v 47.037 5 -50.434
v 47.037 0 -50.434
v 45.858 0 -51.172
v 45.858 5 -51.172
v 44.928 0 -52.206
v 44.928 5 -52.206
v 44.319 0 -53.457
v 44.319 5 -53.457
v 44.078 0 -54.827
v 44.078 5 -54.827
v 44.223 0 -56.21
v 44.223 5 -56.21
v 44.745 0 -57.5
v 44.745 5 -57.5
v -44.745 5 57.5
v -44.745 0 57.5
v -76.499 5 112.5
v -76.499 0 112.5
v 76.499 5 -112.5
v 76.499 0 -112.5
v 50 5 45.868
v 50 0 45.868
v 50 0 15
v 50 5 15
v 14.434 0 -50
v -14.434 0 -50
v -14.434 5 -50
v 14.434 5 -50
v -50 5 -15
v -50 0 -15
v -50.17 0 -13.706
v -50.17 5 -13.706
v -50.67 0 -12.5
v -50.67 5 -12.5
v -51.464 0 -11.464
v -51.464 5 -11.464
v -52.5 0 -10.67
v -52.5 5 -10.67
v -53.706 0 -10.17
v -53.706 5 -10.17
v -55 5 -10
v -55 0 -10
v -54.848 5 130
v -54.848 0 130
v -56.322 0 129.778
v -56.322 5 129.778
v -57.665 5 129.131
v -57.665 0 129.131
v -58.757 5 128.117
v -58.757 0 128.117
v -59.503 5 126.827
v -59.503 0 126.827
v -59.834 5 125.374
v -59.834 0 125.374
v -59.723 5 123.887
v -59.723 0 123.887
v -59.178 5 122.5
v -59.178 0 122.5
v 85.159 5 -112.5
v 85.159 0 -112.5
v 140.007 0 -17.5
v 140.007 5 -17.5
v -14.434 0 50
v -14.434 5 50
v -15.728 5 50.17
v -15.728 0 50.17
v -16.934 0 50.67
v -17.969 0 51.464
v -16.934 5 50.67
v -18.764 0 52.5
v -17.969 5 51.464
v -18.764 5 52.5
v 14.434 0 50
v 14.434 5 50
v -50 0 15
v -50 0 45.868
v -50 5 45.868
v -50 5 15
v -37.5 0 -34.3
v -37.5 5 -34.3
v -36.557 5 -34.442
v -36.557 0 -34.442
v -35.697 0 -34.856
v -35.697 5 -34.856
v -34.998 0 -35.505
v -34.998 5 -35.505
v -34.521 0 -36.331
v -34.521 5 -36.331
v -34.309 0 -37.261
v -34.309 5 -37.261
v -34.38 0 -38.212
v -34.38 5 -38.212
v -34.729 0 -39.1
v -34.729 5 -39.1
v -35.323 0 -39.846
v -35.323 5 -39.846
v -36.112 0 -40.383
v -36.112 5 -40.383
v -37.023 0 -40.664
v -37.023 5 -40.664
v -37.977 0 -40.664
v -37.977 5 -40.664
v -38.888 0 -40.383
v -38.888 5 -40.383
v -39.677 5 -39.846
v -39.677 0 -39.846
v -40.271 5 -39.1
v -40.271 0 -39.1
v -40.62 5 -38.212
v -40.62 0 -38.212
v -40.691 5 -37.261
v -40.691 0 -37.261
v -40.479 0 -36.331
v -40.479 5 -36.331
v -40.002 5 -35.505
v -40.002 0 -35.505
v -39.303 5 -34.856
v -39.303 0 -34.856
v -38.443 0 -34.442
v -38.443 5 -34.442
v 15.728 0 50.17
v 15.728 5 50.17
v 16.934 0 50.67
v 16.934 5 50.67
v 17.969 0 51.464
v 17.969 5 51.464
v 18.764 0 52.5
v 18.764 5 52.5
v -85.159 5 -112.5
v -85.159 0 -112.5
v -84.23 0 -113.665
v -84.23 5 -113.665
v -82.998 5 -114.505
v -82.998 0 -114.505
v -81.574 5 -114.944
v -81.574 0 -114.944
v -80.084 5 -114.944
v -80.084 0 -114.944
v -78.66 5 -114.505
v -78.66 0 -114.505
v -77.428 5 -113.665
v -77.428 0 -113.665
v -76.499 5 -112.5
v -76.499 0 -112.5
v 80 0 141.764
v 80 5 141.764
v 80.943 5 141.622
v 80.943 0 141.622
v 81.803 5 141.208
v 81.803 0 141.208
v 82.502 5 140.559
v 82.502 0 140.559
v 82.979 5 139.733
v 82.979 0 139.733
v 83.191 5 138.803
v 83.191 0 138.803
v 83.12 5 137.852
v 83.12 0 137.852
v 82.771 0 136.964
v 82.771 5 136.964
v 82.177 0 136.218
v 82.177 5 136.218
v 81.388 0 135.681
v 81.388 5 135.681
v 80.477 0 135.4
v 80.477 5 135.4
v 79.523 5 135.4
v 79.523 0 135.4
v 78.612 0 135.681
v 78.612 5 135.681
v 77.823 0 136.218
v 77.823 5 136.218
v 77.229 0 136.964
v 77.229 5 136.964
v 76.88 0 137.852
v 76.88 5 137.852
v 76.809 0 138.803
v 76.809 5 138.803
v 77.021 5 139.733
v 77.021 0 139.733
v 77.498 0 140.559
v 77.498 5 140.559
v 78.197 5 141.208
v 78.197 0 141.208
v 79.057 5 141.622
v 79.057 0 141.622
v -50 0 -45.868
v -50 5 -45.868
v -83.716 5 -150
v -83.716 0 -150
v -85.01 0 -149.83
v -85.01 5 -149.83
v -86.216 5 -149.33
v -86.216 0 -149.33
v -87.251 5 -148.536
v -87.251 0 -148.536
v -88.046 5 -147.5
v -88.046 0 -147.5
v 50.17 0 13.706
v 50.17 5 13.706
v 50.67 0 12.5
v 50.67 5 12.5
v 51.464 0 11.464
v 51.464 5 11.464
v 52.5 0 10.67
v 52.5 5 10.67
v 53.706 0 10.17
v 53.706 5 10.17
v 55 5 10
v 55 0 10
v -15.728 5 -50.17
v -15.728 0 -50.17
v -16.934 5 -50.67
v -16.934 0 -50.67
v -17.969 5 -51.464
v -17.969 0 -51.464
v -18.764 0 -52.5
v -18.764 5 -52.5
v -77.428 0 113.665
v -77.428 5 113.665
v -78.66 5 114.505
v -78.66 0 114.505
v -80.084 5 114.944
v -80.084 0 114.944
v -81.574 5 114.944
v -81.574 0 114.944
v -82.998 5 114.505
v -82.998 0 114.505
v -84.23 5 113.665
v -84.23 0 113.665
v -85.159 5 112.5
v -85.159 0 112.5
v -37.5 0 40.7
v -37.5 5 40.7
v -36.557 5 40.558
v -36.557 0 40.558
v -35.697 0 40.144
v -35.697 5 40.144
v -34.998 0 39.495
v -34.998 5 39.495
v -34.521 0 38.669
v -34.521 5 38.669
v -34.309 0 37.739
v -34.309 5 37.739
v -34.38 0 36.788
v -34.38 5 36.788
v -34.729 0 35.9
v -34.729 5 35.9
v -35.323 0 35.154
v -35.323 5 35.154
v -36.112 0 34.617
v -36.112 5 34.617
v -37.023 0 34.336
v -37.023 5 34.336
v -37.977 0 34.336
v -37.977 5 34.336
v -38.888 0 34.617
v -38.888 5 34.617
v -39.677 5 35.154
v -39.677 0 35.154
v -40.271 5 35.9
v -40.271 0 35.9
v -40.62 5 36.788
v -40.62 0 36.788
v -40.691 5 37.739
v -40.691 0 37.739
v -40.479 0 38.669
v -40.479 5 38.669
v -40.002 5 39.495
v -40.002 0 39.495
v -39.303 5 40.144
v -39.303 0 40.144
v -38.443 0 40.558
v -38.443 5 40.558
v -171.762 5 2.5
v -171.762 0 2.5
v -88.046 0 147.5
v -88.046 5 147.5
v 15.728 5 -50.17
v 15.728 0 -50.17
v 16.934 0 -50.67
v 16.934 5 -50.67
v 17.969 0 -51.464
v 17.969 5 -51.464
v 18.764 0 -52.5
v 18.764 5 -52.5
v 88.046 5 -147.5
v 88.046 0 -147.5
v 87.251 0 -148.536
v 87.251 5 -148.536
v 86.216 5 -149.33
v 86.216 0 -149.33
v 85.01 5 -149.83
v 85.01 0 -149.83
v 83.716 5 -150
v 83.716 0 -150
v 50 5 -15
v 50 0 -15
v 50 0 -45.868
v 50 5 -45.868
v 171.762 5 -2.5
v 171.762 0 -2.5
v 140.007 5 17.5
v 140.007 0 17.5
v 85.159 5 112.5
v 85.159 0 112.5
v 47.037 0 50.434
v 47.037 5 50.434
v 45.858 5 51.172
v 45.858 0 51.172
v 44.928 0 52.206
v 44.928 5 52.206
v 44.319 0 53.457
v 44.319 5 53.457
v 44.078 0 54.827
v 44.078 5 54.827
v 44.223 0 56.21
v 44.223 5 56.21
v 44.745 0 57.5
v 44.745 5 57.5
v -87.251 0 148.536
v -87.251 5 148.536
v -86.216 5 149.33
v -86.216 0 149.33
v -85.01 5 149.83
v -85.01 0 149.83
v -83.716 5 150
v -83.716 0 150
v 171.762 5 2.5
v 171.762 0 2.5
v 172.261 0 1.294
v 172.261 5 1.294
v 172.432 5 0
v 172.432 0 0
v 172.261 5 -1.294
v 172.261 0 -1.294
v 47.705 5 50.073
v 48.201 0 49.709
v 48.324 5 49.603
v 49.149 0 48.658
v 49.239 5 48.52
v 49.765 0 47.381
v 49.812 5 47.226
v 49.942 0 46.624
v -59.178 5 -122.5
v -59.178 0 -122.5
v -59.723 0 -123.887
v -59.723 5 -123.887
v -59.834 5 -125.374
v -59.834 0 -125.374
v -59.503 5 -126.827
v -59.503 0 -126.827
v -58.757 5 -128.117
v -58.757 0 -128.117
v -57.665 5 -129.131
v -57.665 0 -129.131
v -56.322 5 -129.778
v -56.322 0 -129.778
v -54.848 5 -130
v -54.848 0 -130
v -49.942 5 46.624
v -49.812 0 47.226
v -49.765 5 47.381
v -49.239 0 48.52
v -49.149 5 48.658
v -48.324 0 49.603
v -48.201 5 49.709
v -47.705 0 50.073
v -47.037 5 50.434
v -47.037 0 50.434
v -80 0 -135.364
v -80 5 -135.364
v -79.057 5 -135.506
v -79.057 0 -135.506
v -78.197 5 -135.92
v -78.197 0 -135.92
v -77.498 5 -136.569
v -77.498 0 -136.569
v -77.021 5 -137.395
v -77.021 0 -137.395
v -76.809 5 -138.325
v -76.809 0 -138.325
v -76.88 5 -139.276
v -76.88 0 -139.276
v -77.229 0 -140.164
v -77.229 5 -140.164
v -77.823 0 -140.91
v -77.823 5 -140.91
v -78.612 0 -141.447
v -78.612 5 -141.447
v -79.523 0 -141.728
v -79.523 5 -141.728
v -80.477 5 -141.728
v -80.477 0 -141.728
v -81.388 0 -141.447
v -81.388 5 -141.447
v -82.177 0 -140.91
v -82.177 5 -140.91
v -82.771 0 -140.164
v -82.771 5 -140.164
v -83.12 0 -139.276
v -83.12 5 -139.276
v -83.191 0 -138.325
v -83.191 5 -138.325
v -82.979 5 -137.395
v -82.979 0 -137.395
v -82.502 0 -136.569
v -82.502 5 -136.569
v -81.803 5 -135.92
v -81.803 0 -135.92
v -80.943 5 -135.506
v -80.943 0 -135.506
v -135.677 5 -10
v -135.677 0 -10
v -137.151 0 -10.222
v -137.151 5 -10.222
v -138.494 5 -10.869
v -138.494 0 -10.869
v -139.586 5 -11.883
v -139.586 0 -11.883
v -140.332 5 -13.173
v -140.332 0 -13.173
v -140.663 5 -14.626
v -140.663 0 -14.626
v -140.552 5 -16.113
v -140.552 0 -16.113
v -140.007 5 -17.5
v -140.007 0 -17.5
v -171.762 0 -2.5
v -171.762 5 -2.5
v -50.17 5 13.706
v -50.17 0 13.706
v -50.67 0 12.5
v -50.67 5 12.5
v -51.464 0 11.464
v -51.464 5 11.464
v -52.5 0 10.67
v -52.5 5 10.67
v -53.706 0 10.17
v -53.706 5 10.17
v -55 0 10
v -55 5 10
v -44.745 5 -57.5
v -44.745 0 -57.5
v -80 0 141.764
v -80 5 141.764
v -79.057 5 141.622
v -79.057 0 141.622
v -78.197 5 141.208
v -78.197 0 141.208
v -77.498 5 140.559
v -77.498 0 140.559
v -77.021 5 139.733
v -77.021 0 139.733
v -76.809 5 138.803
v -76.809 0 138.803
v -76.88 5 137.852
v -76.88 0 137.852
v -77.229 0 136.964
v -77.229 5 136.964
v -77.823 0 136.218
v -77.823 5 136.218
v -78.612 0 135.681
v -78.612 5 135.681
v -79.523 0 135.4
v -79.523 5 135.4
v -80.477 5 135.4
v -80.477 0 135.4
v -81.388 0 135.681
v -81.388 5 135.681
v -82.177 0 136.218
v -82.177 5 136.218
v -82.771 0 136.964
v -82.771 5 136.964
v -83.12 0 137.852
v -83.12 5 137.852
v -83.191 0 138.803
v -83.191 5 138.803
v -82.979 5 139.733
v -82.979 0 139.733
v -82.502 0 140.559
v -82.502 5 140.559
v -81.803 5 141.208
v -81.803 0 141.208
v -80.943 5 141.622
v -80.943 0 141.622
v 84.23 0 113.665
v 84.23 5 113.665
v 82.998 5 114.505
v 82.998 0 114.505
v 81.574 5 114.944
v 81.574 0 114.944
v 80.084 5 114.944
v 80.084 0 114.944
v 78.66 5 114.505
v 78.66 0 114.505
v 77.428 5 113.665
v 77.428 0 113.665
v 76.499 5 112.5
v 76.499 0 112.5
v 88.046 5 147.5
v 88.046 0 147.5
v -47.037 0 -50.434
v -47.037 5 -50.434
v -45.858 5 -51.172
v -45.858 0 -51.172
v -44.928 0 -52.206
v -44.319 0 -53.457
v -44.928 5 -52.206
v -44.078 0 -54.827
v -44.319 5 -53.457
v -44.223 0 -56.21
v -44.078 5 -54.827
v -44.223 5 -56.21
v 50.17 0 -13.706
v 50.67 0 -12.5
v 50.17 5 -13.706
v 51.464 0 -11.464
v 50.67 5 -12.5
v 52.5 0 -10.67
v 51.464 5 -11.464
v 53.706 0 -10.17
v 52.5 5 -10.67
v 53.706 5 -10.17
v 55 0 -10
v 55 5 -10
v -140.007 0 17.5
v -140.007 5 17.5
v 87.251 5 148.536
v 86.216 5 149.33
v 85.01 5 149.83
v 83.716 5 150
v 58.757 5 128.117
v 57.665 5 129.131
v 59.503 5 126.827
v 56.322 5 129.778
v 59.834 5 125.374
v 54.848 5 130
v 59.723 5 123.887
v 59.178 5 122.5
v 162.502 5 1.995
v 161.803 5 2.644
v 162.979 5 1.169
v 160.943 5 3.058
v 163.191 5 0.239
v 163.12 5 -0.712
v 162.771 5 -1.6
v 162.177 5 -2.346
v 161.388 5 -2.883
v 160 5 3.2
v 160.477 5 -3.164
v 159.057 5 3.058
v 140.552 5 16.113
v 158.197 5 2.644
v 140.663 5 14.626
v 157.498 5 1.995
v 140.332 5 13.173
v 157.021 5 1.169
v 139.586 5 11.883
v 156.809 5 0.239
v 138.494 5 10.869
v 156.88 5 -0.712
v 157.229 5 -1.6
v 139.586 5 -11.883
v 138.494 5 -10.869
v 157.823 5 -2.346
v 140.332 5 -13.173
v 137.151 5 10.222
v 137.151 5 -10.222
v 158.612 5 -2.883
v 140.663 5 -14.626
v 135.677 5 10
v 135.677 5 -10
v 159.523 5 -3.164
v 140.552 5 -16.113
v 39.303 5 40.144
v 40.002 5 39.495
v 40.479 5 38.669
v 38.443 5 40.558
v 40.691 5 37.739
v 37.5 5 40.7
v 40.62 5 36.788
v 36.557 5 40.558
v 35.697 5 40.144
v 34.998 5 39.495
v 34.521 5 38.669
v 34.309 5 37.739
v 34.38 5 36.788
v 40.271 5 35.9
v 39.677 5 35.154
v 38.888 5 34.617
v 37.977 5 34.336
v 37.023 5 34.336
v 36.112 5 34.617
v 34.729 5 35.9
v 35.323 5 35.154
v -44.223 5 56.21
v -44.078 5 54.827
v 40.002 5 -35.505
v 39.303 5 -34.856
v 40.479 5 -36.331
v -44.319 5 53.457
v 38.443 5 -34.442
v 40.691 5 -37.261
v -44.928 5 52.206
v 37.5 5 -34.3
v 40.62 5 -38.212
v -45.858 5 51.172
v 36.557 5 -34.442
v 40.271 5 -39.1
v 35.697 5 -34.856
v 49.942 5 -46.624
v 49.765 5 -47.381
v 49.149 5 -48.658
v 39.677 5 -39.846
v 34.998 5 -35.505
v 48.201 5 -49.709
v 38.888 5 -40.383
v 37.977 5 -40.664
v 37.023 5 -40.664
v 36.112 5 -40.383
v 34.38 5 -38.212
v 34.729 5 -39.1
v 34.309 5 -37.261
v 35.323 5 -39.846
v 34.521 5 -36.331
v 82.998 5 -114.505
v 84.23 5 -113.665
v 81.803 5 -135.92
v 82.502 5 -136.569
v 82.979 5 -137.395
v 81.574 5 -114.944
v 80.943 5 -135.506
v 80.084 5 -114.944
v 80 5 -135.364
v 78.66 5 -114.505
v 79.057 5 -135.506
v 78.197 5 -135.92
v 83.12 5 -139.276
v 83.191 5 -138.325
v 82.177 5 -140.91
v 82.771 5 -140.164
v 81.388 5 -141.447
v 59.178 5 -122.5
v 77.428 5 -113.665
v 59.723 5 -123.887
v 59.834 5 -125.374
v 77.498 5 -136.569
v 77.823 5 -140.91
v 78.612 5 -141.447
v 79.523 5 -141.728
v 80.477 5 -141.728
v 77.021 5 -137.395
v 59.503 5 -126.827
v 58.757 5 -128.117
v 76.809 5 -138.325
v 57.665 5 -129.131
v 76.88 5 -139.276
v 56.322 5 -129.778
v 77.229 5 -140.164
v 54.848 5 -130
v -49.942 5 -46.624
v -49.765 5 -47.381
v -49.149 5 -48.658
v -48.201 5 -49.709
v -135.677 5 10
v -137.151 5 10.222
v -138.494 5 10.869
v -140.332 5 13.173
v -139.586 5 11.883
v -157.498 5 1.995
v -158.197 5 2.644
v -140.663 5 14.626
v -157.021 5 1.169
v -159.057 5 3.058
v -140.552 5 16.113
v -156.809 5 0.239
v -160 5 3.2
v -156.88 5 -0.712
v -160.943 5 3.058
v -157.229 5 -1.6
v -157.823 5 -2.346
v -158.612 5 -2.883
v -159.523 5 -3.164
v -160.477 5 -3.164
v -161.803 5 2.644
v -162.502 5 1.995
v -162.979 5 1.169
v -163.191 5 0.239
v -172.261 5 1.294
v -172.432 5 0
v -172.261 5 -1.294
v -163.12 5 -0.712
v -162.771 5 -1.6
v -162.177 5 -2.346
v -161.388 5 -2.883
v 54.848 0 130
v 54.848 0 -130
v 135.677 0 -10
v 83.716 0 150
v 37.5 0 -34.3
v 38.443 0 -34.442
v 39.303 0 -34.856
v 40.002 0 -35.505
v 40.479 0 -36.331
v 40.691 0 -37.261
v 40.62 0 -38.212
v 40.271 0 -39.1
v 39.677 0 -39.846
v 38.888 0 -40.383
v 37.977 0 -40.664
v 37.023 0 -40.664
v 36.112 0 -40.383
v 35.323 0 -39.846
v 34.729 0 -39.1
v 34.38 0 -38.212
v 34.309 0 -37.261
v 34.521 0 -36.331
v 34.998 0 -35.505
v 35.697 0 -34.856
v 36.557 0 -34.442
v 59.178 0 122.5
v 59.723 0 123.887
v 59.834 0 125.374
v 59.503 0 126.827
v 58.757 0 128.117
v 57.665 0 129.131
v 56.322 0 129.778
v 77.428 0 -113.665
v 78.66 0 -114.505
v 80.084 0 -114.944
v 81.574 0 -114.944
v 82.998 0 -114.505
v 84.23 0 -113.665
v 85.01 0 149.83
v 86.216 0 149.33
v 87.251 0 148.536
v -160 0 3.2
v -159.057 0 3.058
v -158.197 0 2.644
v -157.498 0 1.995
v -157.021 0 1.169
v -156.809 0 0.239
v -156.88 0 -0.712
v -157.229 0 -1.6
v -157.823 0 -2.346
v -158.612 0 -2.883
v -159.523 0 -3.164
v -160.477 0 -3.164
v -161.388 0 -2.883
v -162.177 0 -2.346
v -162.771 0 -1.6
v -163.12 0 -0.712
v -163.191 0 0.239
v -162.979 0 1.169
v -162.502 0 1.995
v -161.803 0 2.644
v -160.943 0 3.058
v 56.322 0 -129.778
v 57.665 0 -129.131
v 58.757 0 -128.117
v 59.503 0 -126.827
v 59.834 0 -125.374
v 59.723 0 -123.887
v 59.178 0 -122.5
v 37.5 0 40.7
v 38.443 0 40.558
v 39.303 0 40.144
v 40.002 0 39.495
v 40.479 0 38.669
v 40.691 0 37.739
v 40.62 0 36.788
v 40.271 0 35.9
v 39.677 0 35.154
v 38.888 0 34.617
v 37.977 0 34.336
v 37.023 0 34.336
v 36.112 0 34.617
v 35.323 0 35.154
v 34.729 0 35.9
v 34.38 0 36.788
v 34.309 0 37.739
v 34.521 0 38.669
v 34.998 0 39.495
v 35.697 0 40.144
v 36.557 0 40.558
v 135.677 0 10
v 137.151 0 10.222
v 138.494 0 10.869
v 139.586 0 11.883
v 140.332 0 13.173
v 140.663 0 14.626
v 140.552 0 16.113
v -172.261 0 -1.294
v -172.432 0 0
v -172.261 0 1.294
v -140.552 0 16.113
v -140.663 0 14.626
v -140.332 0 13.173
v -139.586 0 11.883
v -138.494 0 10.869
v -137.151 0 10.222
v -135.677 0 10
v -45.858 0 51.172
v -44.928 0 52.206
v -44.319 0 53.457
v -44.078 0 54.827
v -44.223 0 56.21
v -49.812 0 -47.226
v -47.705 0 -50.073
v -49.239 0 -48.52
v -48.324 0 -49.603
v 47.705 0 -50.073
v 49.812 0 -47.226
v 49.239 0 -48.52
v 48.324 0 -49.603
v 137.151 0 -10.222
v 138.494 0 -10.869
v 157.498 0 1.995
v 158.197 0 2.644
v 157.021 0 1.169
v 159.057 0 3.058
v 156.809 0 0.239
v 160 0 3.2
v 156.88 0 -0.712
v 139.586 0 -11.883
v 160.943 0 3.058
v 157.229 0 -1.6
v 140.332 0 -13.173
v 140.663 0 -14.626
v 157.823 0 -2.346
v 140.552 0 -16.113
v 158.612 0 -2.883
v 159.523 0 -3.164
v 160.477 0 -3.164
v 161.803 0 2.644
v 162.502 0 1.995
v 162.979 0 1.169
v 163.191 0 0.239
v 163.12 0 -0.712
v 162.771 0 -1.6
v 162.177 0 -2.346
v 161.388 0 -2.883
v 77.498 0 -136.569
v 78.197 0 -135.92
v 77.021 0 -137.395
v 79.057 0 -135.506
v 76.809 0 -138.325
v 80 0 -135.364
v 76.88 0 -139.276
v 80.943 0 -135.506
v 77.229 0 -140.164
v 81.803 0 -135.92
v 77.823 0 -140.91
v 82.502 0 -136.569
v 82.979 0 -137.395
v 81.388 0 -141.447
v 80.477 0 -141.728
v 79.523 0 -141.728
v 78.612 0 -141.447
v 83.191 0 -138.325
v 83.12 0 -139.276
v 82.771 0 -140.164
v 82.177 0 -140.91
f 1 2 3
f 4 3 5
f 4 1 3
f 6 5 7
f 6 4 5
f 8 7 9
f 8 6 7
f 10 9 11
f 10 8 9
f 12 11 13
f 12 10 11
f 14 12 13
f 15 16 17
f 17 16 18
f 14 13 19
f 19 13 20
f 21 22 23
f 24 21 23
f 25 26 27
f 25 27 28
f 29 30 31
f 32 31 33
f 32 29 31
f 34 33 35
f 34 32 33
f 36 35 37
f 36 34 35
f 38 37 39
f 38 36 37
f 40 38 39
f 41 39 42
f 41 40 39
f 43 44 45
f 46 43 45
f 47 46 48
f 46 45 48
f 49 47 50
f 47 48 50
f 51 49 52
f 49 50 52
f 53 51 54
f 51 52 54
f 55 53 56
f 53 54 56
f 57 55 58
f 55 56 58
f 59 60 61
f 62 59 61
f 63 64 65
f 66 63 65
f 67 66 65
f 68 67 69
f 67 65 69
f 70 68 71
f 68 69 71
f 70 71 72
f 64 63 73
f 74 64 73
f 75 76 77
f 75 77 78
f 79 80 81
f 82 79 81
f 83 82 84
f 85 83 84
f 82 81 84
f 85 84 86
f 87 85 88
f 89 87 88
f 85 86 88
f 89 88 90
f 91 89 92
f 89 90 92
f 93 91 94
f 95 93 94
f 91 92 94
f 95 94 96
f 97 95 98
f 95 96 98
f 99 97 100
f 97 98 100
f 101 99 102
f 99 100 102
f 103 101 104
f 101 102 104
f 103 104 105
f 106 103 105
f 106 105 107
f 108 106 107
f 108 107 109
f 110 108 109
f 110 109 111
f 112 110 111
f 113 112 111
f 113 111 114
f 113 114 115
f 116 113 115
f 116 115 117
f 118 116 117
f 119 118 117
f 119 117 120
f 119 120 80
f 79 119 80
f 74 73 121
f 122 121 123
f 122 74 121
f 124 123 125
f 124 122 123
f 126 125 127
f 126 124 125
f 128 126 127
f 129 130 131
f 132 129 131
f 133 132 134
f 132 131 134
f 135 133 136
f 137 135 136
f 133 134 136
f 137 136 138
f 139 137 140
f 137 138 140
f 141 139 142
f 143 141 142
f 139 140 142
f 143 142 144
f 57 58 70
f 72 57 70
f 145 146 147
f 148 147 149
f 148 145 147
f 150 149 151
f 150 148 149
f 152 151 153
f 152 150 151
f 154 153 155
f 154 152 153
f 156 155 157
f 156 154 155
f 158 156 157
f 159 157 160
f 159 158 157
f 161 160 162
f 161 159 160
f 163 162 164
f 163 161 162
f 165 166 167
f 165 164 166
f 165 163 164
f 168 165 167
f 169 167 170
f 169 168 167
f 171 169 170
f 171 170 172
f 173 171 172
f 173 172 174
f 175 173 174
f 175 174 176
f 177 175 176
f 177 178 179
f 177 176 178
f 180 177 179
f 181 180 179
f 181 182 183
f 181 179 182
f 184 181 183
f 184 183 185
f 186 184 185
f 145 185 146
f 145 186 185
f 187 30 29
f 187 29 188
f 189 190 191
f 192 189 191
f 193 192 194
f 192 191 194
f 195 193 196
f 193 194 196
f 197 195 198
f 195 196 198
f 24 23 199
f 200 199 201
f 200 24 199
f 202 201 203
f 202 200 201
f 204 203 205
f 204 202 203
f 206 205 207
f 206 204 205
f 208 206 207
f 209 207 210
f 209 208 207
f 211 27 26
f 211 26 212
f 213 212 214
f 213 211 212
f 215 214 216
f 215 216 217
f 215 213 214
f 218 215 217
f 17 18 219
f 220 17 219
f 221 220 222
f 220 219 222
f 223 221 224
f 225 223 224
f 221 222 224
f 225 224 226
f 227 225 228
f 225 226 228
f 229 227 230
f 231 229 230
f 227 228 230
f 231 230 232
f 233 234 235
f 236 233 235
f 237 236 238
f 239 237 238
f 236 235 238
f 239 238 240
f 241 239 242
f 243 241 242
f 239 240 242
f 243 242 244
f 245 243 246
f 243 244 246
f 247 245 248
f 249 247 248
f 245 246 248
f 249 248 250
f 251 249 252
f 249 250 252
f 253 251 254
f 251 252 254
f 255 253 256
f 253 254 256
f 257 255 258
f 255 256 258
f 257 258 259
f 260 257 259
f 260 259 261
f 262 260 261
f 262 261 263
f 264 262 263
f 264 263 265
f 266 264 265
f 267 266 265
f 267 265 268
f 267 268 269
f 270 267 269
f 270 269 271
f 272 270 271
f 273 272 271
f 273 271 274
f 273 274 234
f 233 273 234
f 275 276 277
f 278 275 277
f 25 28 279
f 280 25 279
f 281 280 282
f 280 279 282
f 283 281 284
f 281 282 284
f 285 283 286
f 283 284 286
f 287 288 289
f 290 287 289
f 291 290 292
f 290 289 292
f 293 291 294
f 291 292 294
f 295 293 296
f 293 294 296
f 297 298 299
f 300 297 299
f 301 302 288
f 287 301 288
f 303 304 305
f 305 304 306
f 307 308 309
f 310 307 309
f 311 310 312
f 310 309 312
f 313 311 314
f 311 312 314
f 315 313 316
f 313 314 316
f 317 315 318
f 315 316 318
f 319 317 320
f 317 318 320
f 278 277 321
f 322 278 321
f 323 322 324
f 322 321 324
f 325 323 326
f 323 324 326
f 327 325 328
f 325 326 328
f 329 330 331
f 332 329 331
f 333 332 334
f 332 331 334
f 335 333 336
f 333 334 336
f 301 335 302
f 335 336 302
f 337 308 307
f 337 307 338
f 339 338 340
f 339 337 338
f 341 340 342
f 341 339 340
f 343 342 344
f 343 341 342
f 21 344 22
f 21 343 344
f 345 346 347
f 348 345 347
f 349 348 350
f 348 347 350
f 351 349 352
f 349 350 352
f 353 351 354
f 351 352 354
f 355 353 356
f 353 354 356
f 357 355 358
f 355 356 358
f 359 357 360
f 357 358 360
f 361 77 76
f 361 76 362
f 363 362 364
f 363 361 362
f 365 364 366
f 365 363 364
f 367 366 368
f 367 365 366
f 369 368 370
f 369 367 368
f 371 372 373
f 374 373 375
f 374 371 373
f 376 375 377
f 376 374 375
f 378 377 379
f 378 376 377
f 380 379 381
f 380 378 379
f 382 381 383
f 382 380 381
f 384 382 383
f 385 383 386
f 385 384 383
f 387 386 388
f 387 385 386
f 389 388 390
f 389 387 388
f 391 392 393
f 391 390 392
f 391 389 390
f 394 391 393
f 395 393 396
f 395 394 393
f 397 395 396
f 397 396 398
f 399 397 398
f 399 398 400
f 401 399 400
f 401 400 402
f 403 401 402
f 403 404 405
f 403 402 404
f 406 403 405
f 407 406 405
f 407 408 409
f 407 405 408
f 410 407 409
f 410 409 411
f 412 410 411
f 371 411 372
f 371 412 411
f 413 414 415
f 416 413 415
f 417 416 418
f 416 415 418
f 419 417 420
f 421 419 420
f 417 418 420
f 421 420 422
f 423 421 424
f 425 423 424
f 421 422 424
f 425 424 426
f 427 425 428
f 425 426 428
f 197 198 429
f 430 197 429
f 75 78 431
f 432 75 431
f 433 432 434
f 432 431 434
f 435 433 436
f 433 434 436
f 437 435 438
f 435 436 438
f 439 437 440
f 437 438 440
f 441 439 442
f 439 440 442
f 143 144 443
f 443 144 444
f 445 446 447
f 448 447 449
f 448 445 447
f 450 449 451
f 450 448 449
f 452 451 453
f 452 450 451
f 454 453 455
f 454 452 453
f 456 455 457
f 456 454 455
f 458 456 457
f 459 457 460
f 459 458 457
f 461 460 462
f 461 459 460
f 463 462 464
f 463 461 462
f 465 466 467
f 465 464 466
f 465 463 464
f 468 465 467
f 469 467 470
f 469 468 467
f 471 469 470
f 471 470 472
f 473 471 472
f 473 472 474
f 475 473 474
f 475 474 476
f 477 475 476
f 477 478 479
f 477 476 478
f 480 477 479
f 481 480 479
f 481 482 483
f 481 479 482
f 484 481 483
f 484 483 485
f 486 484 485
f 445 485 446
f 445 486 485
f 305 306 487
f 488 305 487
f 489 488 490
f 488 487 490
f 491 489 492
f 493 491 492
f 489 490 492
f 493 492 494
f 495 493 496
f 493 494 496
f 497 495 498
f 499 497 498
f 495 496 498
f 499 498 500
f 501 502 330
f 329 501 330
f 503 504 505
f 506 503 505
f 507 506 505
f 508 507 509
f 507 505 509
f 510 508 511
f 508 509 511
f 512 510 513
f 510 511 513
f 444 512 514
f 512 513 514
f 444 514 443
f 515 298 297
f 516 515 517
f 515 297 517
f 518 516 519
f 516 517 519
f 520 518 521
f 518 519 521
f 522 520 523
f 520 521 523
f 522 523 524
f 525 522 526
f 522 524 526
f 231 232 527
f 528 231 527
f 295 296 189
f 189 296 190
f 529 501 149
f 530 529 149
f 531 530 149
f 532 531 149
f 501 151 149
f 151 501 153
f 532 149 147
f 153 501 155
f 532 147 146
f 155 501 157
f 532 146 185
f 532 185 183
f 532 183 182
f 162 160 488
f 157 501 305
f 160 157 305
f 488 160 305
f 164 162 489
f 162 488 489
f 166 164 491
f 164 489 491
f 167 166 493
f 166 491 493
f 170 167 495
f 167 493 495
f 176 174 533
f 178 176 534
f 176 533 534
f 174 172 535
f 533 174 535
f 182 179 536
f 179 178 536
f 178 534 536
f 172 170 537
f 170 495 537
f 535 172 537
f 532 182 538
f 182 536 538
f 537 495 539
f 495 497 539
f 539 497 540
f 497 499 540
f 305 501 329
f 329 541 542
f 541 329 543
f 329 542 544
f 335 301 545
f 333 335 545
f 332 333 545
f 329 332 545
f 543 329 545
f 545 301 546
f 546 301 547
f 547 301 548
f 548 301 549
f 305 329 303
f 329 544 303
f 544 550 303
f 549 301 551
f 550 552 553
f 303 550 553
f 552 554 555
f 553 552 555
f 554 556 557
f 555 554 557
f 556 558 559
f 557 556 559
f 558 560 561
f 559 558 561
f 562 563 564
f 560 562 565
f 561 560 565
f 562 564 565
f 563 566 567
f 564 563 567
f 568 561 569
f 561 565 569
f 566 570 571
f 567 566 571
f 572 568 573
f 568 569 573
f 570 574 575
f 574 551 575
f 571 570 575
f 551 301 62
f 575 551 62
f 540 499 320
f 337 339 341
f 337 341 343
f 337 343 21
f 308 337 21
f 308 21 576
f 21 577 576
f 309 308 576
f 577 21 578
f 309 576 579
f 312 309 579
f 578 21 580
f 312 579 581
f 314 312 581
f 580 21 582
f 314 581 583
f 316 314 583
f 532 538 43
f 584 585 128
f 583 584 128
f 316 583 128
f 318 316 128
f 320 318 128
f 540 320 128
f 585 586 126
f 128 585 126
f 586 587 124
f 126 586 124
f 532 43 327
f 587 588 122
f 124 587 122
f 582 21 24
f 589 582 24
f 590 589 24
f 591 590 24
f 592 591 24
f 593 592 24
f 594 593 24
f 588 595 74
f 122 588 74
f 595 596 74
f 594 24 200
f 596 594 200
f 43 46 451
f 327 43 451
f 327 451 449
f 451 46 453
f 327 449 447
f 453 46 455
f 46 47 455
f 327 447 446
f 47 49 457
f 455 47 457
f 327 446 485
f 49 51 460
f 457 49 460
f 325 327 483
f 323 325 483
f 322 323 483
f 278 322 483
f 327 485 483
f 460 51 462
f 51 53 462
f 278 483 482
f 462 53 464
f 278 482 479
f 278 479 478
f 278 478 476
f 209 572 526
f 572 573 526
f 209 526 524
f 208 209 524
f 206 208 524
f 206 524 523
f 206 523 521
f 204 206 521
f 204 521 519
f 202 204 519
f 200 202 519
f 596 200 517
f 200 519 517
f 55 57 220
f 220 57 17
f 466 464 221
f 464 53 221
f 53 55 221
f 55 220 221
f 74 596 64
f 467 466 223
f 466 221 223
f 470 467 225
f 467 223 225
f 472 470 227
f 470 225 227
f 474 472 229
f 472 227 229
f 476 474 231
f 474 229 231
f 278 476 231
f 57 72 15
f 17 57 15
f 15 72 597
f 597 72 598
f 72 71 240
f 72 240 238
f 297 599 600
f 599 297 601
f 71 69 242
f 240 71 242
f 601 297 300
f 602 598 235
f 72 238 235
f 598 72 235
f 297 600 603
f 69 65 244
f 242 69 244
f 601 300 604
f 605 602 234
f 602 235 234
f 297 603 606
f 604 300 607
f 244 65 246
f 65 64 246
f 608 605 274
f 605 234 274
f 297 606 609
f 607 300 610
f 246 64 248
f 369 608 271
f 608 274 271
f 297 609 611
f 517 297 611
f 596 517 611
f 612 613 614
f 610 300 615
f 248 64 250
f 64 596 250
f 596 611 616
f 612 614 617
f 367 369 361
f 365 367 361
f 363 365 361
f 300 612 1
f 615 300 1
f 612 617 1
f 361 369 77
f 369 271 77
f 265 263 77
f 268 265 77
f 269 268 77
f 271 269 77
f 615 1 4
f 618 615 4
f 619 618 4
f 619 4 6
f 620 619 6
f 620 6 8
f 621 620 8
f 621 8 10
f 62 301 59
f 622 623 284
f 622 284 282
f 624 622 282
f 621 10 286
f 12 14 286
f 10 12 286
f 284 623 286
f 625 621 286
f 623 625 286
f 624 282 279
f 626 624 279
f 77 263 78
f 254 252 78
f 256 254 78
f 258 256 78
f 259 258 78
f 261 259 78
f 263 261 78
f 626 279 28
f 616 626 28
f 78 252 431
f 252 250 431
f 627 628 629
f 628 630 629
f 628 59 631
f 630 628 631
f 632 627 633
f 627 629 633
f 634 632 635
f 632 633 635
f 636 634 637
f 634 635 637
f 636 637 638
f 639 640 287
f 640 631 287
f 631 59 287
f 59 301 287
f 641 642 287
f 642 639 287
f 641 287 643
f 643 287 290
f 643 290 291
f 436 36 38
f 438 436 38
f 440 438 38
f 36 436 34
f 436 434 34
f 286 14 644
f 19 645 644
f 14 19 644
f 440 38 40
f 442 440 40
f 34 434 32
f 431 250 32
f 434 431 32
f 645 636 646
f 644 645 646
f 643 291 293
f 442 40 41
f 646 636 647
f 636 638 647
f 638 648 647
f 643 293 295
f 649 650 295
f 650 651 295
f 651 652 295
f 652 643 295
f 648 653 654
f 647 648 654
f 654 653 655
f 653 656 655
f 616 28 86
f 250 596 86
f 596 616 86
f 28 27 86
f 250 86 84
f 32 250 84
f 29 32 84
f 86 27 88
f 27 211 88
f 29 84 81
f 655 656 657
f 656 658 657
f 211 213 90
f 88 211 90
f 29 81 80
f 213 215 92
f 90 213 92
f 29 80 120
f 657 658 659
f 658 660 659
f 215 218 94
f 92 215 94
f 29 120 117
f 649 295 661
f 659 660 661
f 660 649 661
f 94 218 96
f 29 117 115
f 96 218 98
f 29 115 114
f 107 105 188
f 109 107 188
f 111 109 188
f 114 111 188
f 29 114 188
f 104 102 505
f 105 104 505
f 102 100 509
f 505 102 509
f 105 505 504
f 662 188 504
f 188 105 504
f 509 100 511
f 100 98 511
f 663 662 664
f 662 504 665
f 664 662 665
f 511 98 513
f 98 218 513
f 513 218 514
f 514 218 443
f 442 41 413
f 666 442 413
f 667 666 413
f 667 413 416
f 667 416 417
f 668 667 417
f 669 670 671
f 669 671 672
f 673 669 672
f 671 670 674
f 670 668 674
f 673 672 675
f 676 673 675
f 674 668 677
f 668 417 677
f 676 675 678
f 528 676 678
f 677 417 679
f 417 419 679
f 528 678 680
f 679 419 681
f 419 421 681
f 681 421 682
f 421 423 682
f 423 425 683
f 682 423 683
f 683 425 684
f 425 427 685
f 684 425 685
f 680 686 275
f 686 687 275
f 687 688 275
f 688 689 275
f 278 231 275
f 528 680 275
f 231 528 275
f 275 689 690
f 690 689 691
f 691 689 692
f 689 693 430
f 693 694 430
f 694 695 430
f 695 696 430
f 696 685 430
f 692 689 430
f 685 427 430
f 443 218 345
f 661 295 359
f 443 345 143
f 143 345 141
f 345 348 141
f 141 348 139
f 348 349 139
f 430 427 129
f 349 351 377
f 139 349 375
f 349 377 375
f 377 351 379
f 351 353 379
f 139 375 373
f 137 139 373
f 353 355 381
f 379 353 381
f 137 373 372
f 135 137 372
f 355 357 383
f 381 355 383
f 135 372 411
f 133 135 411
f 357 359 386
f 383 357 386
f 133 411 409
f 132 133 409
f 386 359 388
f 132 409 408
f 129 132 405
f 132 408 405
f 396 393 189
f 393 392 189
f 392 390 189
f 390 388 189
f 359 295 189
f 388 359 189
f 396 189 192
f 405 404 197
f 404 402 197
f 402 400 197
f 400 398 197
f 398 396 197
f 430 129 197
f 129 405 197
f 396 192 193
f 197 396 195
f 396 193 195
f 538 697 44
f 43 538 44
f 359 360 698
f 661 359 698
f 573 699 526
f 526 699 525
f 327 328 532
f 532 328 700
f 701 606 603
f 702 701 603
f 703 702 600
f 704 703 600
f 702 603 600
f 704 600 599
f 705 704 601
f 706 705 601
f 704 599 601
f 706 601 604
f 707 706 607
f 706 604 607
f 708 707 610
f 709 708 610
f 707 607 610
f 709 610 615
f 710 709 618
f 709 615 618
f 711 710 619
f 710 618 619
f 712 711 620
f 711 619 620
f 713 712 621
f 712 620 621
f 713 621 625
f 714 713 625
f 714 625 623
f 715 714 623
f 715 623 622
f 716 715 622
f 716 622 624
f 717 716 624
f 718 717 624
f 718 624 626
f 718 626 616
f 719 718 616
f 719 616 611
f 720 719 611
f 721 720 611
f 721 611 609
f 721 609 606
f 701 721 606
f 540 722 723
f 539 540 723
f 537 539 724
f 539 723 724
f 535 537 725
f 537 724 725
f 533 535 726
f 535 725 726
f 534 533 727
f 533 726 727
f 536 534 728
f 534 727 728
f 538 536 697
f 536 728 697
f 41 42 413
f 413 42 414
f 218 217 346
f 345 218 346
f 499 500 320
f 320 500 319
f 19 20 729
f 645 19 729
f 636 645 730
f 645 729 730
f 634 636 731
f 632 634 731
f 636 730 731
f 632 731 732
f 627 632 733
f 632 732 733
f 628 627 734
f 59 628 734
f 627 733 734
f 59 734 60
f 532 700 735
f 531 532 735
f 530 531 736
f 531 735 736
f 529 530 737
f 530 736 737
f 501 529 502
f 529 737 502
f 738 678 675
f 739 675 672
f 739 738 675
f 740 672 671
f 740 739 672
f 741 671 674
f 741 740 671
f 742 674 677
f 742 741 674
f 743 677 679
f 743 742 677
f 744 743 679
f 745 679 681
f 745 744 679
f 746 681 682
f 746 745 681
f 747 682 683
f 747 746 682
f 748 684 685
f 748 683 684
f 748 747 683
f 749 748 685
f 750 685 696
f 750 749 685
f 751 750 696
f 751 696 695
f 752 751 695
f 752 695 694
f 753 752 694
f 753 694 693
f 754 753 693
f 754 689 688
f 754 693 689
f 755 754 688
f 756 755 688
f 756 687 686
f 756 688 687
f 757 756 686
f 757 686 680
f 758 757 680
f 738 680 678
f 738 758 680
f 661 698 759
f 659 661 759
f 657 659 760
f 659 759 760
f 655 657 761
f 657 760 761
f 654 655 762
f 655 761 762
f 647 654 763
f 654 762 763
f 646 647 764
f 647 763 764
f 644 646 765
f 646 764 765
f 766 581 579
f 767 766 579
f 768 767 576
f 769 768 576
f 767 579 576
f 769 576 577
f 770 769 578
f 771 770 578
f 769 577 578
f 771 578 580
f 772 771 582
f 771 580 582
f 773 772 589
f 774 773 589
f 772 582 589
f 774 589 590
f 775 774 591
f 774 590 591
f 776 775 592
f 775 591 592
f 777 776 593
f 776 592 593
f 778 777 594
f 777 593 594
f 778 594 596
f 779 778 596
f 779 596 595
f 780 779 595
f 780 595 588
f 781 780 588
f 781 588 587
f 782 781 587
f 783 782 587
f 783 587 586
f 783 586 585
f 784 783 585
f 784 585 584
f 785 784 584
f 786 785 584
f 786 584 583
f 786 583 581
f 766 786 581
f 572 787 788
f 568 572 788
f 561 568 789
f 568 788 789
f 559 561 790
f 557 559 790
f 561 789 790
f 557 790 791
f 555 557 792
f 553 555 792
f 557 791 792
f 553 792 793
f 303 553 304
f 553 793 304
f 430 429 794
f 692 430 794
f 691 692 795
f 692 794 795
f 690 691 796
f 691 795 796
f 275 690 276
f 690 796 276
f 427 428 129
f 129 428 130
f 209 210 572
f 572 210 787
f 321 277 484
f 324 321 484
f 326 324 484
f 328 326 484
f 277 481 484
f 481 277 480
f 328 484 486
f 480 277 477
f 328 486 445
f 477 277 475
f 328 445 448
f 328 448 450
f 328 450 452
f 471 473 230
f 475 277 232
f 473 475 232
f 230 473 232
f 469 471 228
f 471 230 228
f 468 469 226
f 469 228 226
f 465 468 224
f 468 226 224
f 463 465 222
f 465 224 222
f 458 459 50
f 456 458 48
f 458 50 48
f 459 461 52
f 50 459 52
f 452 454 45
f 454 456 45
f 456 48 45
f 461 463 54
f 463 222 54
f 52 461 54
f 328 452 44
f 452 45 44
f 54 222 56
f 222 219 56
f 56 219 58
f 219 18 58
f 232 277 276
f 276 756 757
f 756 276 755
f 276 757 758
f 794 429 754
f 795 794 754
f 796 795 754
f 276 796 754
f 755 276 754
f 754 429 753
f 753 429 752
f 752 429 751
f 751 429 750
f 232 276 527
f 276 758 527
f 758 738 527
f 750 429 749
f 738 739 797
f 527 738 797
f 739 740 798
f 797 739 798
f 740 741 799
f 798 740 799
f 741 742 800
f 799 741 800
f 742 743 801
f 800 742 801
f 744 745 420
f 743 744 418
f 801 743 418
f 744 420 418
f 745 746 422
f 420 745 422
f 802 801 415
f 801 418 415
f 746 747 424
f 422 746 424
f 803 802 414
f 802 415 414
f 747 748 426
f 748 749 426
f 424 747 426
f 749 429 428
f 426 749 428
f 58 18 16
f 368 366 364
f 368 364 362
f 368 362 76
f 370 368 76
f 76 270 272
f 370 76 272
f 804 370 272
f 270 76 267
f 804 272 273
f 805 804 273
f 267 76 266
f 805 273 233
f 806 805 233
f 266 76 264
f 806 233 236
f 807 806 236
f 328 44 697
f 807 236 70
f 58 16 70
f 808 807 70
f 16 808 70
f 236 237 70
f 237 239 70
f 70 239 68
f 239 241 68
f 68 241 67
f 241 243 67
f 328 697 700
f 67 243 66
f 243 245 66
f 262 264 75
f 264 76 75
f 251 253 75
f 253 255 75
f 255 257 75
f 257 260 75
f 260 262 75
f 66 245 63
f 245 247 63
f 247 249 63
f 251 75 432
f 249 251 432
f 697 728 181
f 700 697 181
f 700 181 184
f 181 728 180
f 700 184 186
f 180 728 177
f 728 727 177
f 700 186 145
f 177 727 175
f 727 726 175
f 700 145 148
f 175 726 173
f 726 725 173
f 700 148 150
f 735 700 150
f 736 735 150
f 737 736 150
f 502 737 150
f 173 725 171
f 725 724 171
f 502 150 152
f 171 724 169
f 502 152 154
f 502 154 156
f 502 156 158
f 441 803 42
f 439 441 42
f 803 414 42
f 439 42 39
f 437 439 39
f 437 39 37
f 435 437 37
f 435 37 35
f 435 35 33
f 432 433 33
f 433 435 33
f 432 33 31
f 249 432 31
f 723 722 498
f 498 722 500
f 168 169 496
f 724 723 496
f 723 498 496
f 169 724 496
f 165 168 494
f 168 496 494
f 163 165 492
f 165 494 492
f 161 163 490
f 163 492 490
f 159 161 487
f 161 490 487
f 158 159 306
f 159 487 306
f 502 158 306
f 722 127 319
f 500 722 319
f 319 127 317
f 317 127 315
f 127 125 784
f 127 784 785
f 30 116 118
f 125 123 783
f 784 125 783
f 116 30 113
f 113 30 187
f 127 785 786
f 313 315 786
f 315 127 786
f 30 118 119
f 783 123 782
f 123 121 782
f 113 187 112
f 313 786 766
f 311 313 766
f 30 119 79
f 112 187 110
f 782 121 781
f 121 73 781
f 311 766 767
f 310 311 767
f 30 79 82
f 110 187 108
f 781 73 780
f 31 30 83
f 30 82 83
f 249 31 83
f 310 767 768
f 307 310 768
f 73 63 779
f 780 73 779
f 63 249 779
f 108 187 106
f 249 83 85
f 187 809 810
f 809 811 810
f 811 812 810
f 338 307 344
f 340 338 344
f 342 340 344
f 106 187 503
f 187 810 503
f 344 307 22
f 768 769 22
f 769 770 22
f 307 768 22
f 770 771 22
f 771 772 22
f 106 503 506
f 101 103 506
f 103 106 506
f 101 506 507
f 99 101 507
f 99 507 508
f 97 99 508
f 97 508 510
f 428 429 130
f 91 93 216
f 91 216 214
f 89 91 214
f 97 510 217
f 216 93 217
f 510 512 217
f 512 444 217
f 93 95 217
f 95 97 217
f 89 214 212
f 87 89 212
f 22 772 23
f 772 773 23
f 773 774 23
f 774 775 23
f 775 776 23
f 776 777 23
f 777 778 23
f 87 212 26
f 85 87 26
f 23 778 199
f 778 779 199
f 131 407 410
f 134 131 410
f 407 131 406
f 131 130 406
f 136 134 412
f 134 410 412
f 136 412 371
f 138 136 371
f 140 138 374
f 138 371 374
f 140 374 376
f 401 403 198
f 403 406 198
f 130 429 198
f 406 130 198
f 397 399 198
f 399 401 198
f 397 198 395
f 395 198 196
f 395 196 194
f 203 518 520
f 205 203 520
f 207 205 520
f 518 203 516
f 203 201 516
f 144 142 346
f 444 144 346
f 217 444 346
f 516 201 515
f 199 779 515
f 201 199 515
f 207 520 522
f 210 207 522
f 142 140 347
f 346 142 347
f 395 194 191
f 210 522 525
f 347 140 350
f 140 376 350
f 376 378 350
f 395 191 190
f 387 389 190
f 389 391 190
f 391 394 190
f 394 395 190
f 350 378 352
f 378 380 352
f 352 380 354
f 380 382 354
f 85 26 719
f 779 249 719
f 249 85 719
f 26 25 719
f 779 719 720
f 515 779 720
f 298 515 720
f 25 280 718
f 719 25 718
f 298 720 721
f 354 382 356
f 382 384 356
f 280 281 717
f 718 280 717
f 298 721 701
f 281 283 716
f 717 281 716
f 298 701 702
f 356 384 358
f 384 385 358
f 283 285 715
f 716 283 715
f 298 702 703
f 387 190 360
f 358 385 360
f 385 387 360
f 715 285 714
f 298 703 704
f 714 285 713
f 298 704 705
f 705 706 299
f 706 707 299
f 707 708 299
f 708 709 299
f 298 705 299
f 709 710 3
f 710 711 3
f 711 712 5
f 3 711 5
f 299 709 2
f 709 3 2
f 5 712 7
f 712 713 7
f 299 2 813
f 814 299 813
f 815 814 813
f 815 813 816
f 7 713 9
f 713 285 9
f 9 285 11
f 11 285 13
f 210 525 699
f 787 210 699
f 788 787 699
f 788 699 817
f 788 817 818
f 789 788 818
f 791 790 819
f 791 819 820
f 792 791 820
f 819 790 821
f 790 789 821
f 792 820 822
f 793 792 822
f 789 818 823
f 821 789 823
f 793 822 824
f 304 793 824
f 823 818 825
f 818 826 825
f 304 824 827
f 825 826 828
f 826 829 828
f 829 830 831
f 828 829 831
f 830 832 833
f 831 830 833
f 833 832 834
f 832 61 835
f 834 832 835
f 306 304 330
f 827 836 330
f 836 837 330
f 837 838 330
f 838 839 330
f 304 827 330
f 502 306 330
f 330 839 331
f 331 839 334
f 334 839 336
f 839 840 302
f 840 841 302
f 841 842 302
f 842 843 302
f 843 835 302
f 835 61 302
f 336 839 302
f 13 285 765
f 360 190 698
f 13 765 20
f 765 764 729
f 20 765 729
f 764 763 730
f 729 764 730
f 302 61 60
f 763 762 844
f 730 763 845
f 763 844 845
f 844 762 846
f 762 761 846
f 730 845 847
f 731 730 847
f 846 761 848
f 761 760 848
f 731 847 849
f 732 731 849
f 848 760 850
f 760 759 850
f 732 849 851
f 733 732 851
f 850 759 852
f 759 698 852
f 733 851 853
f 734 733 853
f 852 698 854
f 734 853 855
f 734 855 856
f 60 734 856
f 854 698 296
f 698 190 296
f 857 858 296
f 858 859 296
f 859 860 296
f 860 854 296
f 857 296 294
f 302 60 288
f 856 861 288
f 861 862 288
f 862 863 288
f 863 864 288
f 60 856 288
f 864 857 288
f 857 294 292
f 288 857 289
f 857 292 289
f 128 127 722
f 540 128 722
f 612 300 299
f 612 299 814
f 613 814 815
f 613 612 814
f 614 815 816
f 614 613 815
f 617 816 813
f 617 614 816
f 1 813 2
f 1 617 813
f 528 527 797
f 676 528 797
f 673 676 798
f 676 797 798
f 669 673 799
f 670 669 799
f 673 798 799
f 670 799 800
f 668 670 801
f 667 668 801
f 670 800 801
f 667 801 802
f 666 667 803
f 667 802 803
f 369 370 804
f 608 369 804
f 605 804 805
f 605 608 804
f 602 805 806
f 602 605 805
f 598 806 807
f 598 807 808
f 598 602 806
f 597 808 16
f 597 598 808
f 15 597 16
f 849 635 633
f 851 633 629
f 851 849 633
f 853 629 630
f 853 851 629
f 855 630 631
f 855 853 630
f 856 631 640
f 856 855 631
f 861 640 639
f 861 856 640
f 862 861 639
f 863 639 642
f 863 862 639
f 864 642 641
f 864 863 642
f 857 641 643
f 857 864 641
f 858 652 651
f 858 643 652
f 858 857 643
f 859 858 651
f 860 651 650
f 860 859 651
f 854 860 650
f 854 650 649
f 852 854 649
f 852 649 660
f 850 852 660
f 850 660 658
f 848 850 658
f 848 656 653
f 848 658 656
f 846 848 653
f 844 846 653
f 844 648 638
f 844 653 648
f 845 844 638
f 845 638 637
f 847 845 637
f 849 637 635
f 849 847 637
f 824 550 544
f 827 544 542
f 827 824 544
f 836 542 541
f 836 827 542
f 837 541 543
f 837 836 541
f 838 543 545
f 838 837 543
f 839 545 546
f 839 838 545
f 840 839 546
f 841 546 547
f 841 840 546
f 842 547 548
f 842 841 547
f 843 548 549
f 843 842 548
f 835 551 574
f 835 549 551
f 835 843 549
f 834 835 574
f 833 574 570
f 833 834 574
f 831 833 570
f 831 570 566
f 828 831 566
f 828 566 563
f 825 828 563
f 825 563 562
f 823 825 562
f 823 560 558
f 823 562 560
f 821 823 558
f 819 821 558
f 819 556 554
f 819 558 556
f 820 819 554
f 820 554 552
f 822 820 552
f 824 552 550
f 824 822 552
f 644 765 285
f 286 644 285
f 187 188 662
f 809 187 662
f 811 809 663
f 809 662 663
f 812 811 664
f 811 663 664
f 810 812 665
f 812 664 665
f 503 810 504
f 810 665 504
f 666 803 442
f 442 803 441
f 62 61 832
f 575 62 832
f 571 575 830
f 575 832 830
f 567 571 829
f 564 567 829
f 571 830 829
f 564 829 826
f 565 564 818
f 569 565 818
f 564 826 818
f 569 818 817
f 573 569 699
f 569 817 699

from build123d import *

# Parameters (mm, degrees)
SKETCH1_R           = 3.2
BOSS_EXTRUDE1_DEPTH = 10
SKETCH2_W           = 100
SKETCH2_H           = 100
BOSS_EXTRUDE2_DEPTH = 10
FILLET1_R           = 5
FILLET2_R           = 5
SKETCH3_R           = 3.2
CUT_EXTRUDE2_DEPTH  = 10
CUT_EXTRUDE3_START  = -5
CUT_EXTRUDE3_DEPTH  = 5


with BuildPart() as part:
    # Sketch1 → Boss-Extrude1 (new body)
    with BuildSketch(Plane(origin=(0, 0, 0), x_dir=(1, 0, 0), z_dir=(0, 1, 0))):
        with BuildLine():
            ThreePointArc((171.761705084, -2.5), (172.431578065, 0), (171.761705084, 2.5))
            Line((171.761705084, 2.5), (88.045916051, 147.5))
            ThreePointArc((88.045916051, 147.5), (86.215789032, 149.330127019), (83.715789032, 150))
            Line((83.715789032, 150), (-83.715789032, 150))
            ThreePointArc((-83.715789032, 150), (-86.215789032, 149.330127019), (-88.045916051, 147.5))
            Line((-88.045916051, 147.5), (-171.761705084, 2.5))
            ThreePointArc((-171.761705084, 2.5), (-172.431578065, 0), (-171.761705084, -2.5))
            Line((-171.761705084, -2.5), (-88.045916051, -147.5))
            ThreePointArc((-88.045916051, -147.5), (-86.215789032, -149.330127019), (-83.715789032, -150))
            Line((-83.715789032, -150), (83.715789032, -150))
            ThreePointArc((83.715789032, -150), (86.215789032, -149.330127019), (88.045916051, -147.5))
            Line((88.045916051, -147.5), (171.761705084, -2.5))
        make_face()
        with Locations((-80, -138.564064606)):
            Circle(SKETCH1_R, mode=Mode.SUBTRACT)
        with Locations((80, -138.564064606)):
            Circle(SKETCH1_R, mode=Mode.SUBTRACT)
        with Locations((-160, 0)):
            Circle(SKETCH1_R, mode=Mode.SUBTRACT)
        with Locations((-80, 138.564064606)):
            Circle(SKETCH1_R, mode=Mode.SUBTRACT)
        with BuildLine():
            ThreePointArc((-85.159164705, 112.5), (-80.829037687, 115), (-76.498910668, 112.5))
            Line((-76.498910668, 112.5), (-40.414518843, 50))
            Line((-40.414518843, 50), (-17.320508076, 50))
            Line((-17.320508076, 50), (-59.178402592, 122.5))
            ThreePointArc((-59.178402592, 122.5), (-59.178402592, 127.5), (-54.848275573, 130))
            Line((-54.848275573, 130), (54.848275573, 130))
            ThreePointArc((54.848275573, 130), (59.178402592, 127.5), (59.178402592, 122.5))
            Line((59.178402592, 122.5), (17.320508076, 50))
            Line((17.320508076, 50), (40.414518843, 50))
            Line((40.414518843, 50), (76.498910668, 112.5))
            ThreePointArc((76.498910668, 112.5), (80.829037687, 115), (85.159164705, 112.5))
            Line((85.159164705, 112.5), (140.007440278, 17.5))
            ThreePointArc((140.007440278, 17.5), (140.007440278, 12.5), (135.67731326, 10))
            Line((135.67731326, 10), (50, 10))
            Line((50, 10), (50, -10))
            Line((50, -10), (135.67731326, -10))
            ThreePointArc((135.67731326, -10), (140.007440278, -12.5), (140.007440278, -17.5))
            Line((140.007440278, -17.5), (85.159164705, -112.5))
            ThreePointArc((85.159164705, -112.5), (80.829037687, -115), (76.498910668, -112.5))
            Line((76.498910668, -112.5), (40.414518843, -50))
            Line((40.414518843, -50), (17.320508076, -50))
            Line((17.320508076, -50), (59.178402592, -122.5))
            ThreePointArc((59.178402592, -122.5), (59.178402592, -127.5), (54.848275573, -130))
            Line((54.848275573, -130), (-54.848275573, -130))
            ThreePointArc((-54.848275573, -130), (-59.178402592, -127.5), (-59.178402592, -122.5))
            Line((-59.178402592, -122.5), (-17.320508076, -50))
            Line((-17.320508076, -50), (-40.414518843, -50))
            Line((-40.414518843, -50), (-76.498910668, -112.5))
            ThreePointArc((-76.498910668, -112.5), (-80.829037687, -115), (-85.159164705, -112.5))
            Line((-85.159164705, -112.5), (-140.007440278, -17.5))
            ThreePointArc((-140.007440278, -17.5), (-140.007440278, -12.5), (-135.67731326, -10))
            Line((-135.67731326, -10), (-50, -10))
            Line((-50, -10), (-50, 10))
            Line((-50, 10), (-135.67731326, 10))
            ThreePointArc((-135.67731326, 10), (-140.007440278, 12.5), (-140.007440278, 17.5))
            Line((-140.007440278, 17.5), (-85.159164705, 112.5))
        make_face(mode=Mode.SUBTRACT)
        with Locations((160, 0)):
            Circle(SKETCH1_R, mode=Mode.SUBTRACT)
        with Locations((80, 138.564064606)):
            Circle(SKETCH1_R, mode=Mode.SUBTRACT)
    extrude(amount=BOSS_EXTRUDE1_DEPTH)

    # Sketch2 → Boss-Extrude2 (add)
    with BuildSketch(Plane(origin=(0, 0, 0), x_dir=(1, 0, 0), z_dir=(0, 1, 0))):
        Rectangle(SKETCH2_W, SKETCH2_H)
    extrude(amount=BOSS_EXTRUDE2_DEPTH)

    # Fillet1
    fillet1_edges = [part.edges().sort_by_distance(p)[0] for p in [
        (-17.320508076, 5, -50),
        (17.320508076, 5, -50),
        (40.414518843, 5, -50),
        (50, 5, -10),
        (50, 5, 10),
        (40.414518843, 5, 50),
        (-17.320508076, 5, 50),
        (17.320508076, 5, 50),
        (-40.414518843, 5, -50),
        (-50, 5, -10),
        (-50, 5, 10),
        (-40.414518843, 5, 50),
    ]]
    fillet(fillet1_edges, radius=FILLET1_R)

    # Fillet2
    fillet2_edges = [part.edges().sort_by_distance(p)[0] for p in [
        (-50, 5, -50),
        (-50, 5, 50),
        (50, 5, 50),
        (50, 5, -50),
    ]]
    fillet(fillet2_edges, radius=FILLET2_R)

    # Sketch3 → Cut-Extrude2 (cut)
    with BuildSketch(Plane(origin=(0, 10, 0), x_dir=(1, 0, 0), z_dir=(0, 1, 0))):
        with Locations((-37.5, 37.5)):
            Circle(SKETCH3_R)
        with Locations((37.5, 37.5)):
            Circle(SKETCH3_R)
        with Locations((37.5, -37.5)):
            Circle(SKETCH3_R)
        with Locations((-37.5, -37.5)):
            Circle(SKETCH3_R)
    extrude(amount=-CUT_EXTRUDE2_DEPTH, mode=Mode.SUBTRACT)

    # Sketch6 → Cut-Extrude3 (cut)
    with BuildSketch(Plane(origin=(0, 10, 0), x_dir=(1, 0, 0), z_dir=(0, 1, 0)).offset(CUT_EXTRUDE3_START)):
        with BuildLine():
            Line((88.045916051, 147.5), (171.761705084, 2.5))
            ThreePointArc((171.761705084, 2.5), (172.431578065, 0), (171.761705084, -2.5))
            Line((171.761705084, -2.5), (88.045916051, -147.5))
            ThreePointArc((88.045916051, -147.5), (86.215789032, -149.330127019), (83.715789032, -150))
            Line((83.715789032, -150), (-83.715789032, -150))
            ThreePointArc((-83.715789032, -150), (-86.215789032, -149.330127019), (-88.045916051, -147.5))
            Line((-88.045916051, -147.5), (-171.761705084, -2.5))
            ThreePointArc((-171.761705084, -2.5), (-172.431578065, 0), (-171.761705084, 2.5))
            Line((-171.761705084, 2.5), (-88.045916051, 147.5))
            ThreePointArc((-88.045916051, 147.5), (-86.215789032, 149.330127019), (-83.715789032, 150))
            Line((-83.715789032, 150), (83.715789032, 150))
            ThreePointArc((83.715789032, 150), (86.215789032, 149.330127019), (88.045916051, 147.5))
        make_face()
    extrude(amount=CUT_EXTRUDE3_DEPTH, mode=Mode.SUBTRACT)


solid = part.part
